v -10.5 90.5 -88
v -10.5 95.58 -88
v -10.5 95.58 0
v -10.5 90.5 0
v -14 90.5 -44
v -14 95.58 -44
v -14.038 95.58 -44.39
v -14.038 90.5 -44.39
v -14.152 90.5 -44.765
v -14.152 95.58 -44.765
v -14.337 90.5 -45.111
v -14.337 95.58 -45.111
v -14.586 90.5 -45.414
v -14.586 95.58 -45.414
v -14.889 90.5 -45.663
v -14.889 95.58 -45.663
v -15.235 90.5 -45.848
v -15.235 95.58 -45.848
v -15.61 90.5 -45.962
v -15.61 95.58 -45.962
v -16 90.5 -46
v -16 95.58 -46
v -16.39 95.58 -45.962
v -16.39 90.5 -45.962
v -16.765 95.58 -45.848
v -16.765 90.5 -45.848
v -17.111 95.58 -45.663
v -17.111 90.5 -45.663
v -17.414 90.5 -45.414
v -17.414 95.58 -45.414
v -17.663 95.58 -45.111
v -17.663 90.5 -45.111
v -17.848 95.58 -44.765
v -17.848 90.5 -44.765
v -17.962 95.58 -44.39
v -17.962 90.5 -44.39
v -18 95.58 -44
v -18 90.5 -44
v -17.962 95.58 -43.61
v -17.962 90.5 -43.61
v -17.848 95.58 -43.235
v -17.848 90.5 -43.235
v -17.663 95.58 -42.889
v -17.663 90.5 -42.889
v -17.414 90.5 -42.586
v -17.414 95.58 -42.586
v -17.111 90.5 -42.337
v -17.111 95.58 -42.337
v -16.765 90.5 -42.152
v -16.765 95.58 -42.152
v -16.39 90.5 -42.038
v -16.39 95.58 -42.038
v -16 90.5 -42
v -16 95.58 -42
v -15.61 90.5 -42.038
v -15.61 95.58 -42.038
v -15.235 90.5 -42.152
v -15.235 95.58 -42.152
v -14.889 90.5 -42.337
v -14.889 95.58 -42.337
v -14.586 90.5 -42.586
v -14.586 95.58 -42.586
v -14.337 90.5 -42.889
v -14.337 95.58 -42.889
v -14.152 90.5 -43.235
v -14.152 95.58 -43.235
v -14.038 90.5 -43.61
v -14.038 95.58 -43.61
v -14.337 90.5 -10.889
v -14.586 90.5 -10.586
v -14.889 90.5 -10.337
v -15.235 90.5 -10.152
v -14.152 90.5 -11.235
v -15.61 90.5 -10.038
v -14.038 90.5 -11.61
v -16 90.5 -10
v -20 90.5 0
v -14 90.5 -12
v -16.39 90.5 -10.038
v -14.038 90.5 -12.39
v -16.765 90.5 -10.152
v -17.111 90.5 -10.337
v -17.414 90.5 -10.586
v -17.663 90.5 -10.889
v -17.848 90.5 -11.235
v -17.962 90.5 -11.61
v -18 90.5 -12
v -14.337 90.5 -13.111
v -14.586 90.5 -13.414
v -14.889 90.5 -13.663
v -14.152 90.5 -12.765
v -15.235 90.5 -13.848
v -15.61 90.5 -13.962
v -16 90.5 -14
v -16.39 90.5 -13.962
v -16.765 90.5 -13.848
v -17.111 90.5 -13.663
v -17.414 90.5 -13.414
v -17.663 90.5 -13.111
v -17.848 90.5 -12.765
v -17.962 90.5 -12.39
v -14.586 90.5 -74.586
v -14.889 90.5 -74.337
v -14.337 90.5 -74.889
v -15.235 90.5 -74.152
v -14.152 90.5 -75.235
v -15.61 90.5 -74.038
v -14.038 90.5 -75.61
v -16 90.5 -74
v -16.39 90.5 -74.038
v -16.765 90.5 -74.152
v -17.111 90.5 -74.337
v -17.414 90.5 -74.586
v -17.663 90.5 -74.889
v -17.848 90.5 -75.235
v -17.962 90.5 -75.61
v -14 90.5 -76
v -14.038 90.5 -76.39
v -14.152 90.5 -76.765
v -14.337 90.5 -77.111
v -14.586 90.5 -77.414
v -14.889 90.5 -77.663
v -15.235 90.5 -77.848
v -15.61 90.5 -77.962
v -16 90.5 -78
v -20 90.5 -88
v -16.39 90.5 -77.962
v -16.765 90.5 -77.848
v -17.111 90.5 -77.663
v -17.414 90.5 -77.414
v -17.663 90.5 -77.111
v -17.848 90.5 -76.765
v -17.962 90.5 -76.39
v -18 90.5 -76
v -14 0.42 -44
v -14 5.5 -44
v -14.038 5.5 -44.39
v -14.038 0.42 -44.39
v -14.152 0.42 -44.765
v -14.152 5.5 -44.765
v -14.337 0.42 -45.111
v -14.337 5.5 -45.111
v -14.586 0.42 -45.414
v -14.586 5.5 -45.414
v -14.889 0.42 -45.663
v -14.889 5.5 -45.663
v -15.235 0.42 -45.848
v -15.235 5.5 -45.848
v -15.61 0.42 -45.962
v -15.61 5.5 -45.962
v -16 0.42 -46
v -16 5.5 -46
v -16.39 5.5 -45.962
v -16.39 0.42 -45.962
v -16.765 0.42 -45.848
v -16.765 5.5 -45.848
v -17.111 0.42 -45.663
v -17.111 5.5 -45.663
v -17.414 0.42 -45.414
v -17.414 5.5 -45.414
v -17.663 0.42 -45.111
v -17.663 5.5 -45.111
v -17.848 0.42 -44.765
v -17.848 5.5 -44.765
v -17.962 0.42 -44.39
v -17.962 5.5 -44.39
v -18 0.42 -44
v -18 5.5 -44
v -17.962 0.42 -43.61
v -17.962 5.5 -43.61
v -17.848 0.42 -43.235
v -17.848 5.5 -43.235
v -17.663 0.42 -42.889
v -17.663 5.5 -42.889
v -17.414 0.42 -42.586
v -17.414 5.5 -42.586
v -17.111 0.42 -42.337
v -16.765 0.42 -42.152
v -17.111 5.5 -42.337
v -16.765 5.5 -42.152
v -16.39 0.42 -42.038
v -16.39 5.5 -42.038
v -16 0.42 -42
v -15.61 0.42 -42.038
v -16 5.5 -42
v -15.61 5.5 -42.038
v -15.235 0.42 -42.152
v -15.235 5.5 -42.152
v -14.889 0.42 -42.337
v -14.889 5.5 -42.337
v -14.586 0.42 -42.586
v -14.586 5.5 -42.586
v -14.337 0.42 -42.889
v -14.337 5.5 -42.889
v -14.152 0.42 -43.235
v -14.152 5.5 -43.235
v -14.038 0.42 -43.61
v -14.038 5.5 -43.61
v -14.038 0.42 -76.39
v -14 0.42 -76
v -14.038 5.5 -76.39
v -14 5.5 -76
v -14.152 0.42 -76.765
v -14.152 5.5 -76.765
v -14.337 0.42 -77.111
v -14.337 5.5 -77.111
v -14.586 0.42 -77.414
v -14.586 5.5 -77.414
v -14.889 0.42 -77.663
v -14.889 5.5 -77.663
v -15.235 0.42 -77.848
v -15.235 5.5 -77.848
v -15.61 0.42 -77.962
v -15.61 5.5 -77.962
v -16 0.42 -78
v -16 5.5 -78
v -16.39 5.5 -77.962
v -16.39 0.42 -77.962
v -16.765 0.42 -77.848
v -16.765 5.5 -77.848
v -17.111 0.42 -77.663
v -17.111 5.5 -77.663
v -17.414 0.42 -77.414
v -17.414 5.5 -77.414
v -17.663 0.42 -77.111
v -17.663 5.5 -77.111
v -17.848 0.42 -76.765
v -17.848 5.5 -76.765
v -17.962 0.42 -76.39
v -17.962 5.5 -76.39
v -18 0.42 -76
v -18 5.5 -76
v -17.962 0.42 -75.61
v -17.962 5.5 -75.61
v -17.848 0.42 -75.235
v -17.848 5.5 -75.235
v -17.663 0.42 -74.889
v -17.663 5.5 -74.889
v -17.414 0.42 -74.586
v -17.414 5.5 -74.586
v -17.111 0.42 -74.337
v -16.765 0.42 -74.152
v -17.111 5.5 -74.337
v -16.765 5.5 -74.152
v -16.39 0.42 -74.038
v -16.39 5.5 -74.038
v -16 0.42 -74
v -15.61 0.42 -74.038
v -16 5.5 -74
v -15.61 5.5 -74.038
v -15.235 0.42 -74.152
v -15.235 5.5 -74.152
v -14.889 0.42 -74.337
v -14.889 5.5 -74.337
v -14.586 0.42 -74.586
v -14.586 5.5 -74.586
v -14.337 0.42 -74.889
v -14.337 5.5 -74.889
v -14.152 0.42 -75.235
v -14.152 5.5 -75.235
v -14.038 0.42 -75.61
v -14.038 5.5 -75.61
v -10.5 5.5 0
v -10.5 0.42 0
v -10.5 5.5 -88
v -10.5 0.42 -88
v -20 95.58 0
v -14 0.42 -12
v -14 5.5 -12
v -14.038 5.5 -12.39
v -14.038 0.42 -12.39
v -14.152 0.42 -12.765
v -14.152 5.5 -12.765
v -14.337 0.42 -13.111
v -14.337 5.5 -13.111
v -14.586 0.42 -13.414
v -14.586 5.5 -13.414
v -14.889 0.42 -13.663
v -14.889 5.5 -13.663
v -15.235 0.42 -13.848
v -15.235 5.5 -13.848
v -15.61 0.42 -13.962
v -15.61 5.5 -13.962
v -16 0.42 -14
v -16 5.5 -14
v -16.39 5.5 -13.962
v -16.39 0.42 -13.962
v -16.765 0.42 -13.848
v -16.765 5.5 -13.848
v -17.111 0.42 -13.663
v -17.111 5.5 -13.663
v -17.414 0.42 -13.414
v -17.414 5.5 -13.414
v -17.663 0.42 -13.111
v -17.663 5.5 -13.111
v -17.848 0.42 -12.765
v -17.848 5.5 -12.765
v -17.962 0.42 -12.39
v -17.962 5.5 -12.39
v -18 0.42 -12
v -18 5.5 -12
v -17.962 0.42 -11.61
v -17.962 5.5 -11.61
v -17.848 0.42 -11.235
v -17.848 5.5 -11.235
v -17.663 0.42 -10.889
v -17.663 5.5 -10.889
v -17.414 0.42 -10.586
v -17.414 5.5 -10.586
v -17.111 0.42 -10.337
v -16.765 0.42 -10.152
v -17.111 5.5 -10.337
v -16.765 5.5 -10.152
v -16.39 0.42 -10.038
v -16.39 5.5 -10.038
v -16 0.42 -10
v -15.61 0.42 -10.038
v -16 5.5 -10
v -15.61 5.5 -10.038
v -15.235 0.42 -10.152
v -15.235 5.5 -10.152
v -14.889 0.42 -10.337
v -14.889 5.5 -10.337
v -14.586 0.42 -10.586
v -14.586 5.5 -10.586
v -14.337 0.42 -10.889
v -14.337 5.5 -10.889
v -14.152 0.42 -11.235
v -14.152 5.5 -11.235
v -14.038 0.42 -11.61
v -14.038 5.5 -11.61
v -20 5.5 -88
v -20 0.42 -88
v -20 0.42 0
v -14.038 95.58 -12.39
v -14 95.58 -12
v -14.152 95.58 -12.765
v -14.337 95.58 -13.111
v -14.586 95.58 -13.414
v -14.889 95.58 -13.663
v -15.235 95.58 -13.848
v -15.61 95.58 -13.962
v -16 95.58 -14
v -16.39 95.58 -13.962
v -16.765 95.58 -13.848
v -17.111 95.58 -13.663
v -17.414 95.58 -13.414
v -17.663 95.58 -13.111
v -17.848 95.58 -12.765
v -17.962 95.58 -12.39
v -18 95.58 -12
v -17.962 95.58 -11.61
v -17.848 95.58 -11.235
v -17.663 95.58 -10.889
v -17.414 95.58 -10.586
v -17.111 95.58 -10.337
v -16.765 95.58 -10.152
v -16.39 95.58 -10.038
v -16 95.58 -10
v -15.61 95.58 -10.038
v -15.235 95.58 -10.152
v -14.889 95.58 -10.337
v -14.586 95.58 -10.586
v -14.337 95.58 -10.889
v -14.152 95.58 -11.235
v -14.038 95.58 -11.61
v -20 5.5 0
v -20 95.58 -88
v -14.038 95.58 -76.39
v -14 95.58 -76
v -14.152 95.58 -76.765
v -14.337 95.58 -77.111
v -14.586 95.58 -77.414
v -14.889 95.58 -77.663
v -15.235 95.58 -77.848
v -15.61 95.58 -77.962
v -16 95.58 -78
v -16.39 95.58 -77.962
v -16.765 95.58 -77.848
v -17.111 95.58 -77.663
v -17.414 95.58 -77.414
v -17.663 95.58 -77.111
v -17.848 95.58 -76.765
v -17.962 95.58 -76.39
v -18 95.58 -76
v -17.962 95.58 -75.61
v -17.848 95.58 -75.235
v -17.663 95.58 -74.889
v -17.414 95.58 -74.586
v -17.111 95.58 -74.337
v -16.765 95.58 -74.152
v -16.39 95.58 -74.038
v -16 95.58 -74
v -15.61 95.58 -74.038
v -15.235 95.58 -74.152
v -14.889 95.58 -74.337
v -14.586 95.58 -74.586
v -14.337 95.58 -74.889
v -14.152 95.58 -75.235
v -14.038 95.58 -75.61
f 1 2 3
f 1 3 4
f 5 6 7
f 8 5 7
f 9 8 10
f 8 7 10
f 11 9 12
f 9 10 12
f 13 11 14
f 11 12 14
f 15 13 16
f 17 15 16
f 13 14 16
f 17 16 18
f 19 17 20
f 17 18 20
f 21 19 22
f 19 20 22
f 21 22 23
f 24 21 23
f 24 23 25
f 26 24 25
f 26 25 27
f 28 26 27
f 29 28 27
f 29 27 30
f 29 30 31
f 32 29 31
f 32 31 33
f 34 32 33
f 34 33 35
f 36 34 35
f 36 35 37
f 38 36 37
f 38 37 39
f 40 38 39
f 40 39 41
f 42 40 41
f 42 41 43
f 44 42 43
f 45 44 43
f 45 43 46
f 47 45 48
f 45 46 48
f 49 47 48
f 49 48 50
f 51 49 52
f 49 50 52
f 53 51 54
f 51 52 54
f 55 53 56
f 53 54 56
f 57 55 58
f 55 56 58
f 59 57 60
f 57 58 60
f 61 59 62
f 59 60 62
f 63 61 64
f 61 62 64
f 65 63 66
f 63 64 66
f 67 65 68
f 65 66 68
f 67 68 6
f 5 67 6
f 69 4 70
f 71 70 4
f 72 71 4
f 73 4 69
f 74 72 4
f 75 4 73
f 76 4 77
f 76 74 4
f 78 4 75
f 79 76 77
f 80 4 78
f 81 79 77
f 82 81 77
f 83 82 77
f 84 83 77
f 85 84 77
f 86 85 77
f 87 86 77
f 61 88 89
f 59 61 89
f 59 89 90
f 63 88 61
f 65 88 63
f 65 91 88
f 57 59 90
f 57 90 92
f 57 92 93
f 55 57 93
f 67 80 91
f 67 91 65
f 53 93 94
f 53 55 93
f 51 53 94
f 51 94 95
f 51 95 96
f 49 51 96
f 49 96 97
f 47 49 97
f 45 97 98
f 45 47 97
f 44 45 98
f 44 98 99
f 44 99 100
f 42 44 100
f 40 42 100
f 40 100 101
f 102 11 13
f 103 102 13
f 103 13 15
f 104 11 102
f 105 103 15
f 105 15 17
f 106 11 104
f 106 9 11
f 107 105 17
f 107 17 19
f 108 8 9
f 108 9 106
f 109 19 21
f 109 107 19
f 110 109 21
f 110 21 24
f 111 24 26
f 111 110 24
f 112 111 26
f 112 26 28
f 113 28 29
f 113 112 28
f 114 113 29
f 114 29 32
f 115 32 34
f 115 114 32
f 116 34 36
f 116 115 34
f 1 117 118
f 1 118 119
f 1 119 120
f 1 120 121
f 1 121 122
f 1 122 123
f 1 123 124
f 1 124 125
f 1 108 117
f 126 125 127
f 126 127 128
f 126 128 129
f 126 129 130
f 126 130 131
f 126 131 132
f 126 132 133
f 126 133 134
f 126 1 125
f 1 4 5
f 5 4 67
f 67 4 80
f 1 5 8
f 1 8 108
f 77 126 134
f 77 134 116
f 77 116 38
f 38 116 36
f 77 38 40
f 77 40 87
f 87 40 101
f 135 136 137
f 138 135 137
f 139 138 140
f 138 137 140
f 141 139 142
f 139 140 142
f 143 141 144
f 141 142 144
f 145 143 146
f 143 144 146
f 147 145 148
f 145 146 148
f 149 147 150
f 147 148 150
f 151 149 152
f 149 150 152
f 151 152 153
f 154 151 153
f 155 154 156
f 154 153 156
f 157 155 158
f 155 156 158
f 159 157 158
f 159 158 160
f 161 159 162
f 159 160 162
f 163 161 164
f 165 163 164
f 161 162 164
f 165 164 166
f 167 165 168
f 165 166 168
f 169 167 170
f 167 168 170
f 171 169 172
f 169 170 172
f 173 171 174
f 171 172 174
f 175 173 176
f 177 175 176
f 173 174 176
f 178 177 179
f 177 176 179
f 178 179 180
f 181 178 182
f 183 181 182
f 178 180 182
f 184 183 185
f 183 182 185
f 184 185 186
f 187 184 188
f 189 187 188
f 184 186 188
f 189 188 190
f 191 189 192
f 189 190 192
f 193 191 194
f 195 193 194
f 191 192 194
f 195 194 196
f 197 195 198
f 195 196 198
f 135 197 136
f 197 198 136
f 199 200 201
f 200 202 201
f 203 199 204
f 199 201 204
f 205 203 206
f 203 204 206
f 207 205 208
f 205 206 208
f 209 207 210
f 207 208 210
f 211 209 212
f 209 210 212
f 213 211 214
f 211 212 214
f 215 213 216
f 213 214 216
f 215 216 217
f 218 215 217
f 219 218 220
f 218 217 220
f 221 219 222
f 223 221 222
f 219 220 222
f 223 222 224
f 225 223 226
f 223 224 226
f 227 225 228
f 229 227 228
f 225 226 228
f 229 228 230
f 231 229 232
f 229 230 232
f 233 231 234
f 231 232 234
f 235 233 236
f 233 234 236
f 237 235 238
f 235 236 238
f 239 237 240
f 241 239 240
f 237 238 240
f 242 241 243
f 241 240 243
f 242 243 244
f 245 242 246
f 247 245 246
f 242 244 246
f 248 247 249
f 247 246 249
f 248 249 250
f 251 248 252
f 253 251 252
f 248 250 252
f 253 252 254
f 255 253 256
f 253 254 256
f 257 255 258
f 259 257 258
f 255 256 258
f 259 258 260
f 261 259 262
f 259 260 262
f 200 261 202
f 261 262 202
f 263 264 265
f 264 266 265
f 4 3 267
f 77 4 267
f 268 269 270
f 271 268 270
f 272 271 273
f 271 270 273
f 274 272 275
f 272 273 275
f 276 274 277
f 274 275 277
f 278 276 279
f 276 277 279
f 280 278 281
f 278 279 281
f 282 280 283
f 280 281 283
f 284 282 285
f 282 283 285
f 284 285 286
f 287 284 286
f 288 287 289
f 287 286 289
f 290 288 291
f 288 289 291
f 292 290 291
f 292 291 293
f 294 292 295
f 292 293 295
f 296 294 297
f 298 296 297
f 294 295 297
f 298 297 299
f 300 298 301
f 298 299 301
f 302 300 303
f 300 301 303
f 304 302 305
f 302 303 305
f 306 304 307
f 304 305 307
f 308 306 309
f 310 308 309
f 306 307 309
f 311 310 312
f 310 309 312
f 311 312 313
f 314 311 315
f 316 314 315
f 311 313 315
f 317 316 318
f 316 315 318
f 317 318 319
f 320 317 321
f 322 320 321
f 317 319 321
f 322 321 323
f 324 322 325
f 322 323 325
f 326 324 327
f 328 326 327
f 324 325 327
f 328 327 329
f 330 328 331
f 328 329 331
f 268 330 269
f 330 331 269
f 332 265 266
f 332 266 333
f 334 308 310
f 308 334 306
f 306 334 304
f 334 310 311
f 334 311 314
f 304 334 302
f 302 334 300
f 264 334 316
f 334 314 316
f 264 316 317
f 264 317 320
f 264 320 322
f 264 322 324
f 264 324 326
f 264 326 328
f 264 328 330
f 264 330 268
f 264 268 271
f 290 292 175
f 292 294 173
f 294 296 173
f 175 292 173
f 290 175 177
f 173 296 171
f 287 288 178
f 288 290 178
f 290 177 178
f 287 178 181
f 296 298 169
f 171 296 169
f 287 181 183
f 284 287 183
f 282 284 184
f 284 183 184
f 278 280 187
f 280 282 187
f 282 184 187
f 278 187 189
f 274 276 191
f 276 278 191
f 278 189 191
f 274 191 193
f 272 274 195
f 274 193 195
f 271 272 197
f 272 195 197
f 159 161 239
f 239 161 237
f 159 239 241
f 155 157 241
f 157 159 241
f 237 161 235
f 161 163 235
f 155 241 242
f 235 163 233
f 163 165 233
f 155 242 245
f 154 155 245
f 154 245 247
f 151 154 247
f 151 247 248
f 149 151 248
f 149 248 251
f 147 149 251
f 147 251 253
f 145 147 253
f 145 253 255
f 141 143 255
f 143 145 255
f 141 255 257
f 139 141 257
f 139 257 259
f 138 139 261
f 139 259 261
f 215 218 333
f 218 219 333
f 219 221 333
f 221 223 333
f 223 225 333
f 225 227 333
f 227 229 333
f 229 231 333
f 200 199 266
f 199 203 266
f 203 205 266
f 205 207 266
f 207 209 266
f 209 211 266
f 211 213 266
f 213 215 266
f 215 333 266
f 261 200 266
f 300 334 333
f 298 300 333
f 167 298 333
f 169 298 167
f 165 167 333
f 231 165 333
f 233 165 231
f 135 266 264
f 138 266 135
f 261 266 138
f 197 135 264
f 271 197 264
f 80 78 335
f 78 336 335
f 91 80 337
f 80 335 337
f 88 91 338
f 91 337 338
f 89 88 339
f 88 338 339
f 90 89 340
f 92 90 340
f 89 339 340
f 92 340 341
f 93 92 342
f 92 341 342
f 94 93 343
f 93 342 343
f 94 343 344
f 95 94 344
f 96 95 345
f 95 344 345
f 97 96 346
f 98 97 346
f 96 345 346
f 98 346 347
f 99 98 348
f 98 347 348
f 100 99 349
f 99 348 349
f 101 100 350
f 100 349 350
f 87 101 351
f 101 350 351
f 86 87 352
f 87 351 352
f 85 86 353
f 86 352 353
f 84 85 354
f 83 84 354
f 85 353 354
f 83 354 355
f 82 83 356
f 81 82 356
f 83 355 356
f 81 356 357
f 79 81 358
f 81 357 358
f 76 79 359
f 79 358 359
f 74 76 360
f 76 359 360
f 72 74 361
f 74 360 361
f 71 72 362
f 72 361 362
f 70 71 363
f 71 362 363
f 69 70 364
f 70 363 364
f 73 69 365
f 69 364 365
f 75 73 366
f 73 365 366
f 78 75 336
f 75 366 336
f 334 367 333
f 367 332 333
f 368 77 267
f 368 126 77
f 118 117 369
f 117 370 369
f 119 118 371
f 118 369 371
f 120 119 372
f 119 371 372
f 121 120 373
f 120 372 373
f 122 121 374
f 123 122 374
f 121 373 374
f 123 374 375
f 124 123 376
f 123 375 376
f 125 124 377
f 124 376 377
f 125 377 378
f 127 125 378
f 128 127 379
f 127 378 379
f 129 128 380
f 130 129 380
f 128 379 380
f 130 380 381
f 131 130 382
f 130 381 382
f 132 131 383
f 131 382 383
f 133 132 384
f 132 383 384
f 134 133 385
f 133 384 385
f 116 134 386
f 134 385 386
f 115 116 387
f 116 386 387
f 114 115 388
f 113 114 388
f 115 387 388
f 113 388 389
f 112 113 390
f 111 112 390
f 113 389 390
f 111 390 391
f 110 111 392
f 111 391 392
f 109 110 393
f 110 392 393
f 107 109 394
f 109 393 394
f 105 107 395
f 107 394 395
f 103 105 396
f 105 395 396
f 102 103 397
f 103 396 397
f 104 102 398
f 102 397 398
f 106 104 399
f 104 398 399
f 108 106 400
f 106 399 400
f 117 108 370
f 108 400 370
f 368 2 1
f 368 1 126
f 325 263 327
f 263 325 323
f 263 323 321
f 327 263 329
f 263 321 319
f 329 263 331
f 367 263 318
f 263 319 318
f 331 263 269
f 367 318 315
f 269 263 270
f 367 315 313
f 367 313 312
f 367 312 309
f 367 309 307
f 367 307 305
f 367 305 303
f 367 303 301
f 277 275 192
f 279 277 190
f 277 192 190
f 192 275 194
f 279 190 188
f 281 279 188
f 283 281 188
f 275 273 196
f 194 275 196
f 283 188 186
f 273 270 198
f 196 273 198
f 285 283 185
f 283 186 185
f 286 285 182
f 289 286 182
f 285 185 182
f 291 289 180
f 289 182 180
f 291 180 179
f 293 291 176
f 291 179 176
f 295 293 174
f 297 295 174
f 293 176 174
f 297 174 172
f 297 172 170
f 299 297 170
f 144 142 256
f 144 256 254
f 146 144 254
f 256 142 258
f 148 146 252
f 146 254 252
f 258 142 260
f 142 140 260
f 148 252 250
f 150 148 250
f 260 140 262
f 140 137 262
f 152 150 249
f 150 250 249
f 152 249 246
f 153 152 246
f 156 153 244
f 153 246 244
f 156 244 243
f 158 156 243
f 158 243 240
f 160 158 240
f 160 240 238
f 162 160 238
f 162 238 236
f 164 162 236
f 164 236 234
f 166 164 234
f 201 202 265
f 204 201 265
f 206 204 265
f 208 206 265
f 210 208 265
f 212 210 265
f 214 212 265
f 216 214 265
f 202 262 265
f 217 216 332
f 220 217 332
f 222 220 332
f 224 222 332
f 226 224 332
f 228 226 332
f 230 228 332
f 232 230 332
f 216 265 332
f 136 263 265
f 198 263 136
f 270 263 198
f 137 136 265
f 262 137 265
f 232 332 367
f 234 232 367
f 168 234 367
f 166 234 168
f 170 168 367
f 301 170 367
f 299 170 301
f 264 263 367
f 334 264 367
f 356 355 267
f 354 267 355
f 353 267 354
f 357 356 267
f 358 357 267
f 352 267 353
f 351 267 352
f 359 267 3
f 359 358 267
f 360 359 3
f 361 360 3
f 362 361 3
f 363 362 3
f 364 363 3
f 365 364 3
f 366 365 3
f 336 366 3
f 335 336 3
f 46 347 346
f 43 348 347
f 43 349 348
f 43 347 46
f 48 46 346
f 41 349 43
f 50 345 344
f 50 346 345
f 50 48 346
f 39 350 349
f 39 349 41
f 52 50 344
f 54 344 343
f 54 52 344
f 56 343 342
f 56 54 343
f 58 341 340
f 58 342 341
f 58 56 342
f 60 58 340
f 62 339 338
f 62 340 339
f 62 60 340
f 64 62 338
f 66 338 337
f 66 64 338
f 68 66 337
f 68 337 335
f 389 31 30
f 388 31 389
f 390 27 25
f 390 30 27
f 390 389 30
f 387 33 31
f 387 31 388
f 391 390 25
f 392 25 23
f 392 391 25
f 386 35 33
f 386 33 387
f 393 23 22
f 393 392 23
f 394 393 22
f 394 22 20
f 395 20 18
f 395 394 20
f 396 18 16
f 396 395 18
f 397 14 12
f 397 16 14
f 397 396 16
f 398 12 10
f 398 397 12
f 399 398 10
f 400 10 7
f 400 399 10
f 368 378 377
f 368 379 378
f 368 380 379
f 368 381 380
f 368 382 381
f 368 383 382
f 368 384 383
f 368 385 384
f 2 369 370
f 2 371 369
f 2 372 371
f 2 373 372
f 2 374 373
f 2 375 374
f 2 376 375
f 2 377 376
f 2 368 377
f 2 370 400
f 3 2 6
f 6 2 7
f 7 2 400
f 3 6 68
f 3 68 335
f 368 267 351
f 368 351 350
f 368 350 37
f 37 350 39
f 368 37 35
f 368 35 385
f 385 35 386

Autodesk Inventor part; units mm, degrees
ref_plane "YZ Plane" through (0, 0, 0) normal (1, 0, 0) x (0, 1, 0)
ref_plane "XZ Plane" through (0, 0, 0) normal (0, 1, 0) x (-1, 0, 0)
sketch "Sketch1" plane through (0, 0, 0) normal (0, 0, 1) x (1, 0, 0)
  line L0 (-8, 88) -> (-8, 100) construction
  line L1 (272, 92) -> (-8, 92) construction
  line L2 (272, 92) -> (-8, 92) construction
  line L3 (-8, 88) -> (-8, 100) construction
  line L4 (-20, 88) -> (-20, 90.5) construction
  line L5 (-8, 88) -> (-20, 88) construction
  line L6 (-20, 88) -> (-20, 8) construction
  line L7 (-20, 88) -> (-147, 88) construction
  line L8 (-147, 88) -> (-147, 164.2) construction
  line L9 (-147, 164.2) -> (-72.1492, 192.4658) construction
  line L10 (-72.1492, 192.4658) -> (-20, 88) construction
  line L11 (-20, 48) -> (-111.8972, 48) construction
  circle A0 centre (-72.0661, 48) radius 40.005 construction
  line L12 (-71.4336, 8) -> (-20, 8) construction
  line L13 (-147, 164.2) -> (-110.5216, 36.974) construction
  point P0 (0, 0)
  dimension "d21" = 80.01
  dimension "d4" = 127
  dimension "d5" = 76.2
  dimension "d6" = 80.01
  dimension "d20" = 91.8972
  dimension "d23" = 15.999
sketch "Sketch2" plane through (0, 0, 0) normal (0, 1, 0) x (-1, 0, 0)
  line L0 (10.5, -88) -> (20, -88) construction
  circle A0 centre (16, -84) radius 2 construction
  line L1 (16, -84) -> (31.875, -56.5037) construction
  line L2 (16, -84) -> (47.75, -84) construction
  line L3 (20, -88) -> (20, 0) construction
  line L4 (31.875, -56.5037) -> (31.875, -16.4987) construction
  circle A1 centre (31.875, -16.4987) radius 40.005 construction
  circle A2 centre (31.875, -56.5037) radius 40.005 construction
  circle A3 centre (31.875, -56.5037) radius 80.01 construction
  line L5 (111.885, -52.8947) -> (111.885, -78.2947) construction
  point P0 (0, 0)
  dimension "d10" = 31.75
  dimension "d11" = 60
  dimension "d13" = 40.005
  dimension "d14" = 80.01
  dimension "d15" = 80.01
  dimension "d17" = 160.02
  dimension "d18" = 11.875
  dimension "d24" = 25.4
  dimension "d25" = 91.885
ref_plane "Work Plane1" through (0, 100, -88) normal (0, 0, -1) x (-1, 0, 0)
sketch "Sketch3" plane through (0, 100, -88) normal (0, 0, -1) x (-1, 0, 0)
  line L0 (10.5, -94.5) -> (20, -94.5) construction
  line L1 (10.5, -9.5) -> (20, -9.5) construction
  line L2 (10.5, -94.5) -> (20, -94.5)
  line L3 (20, -94.5) -> (20, -99.58)
  line L4 (20, -99.58) -> (10.5, -99.58)
  line L5 (10.5, -99.58) -> (10.5, -94.5)
  line L6 (10.5, -9.5) -> (20, -9.5)
  line L7 (20, -9.5) -> (20, -4.42)
  line L8 (20, -4.42) -> (10.5, -4.42)
  line L9 (10.5, -4.42) -> (10.5, -9.5)
  point P0 (0, -100)
  dimension "d26" = 5.08
  dimension "d27" = 5.08
ref_plane "Work Plane2" through (-20.1567, -4.1567, 0) normal (0, 0, 1) x (1, 0, 0)
extrude "Extrusion1" add sketch "Sketch3" against normal up to surface (88 mm away)
sketch "Sketch4" plane through (0, 100, -88) normal (0, 0, -1) x (-1, 0, 0)
  line L0 (71.4336, -92) -> (20, -92) construction
  line L1 (20, -12) -> (147, -12) construction
  circle A0 centre (72.0661, -52) radius 40.005 construction
  line L2 (20, -92) -> (72.0622, -92.005)
  line L3 (147, 64.2) -> (72.1492, 92.4658) construction
  line L4 (20, -4.42) -> (72.1492, 92.4658) construction
  line L5 (26.6402, 7.9165) -> (120.6802, -27.5957)
  line L6 (147, 64.2) -> (110.5216, -63.026) construction
  line L7 (20, -4.42) -> (26.6402, 7.9165)
  arc A1 (71.4336, -92) -> (110.5216, -63.026) centre (72.0661, -52) ccw
  line L8 (110.5216, -63.026) -> (120.6802, -27.5957)
  line L9 (20, -92) -> (20, -4.42)
  point P0 (0, -100)
sketch "Sketch5" plane through (-20, 95.58, -88) normal (0, 1, 0) x (1, 0, 0)
  circle A0 centre (4, -76) radius 2
  circle A1 centre (4, -12) radius 2
  circle A2 centre (4, -44) radius 2
  point P0 (20, -88)
extrude "Extrusion2" cut sketch "Sketch5" against normal through all
sketch "Sketch6" plane through (0, 100, -88) normal (0, 0, -1) x (-1, 0, 0)
  point P0 (0, -100)
properties part number "TransferChute"
